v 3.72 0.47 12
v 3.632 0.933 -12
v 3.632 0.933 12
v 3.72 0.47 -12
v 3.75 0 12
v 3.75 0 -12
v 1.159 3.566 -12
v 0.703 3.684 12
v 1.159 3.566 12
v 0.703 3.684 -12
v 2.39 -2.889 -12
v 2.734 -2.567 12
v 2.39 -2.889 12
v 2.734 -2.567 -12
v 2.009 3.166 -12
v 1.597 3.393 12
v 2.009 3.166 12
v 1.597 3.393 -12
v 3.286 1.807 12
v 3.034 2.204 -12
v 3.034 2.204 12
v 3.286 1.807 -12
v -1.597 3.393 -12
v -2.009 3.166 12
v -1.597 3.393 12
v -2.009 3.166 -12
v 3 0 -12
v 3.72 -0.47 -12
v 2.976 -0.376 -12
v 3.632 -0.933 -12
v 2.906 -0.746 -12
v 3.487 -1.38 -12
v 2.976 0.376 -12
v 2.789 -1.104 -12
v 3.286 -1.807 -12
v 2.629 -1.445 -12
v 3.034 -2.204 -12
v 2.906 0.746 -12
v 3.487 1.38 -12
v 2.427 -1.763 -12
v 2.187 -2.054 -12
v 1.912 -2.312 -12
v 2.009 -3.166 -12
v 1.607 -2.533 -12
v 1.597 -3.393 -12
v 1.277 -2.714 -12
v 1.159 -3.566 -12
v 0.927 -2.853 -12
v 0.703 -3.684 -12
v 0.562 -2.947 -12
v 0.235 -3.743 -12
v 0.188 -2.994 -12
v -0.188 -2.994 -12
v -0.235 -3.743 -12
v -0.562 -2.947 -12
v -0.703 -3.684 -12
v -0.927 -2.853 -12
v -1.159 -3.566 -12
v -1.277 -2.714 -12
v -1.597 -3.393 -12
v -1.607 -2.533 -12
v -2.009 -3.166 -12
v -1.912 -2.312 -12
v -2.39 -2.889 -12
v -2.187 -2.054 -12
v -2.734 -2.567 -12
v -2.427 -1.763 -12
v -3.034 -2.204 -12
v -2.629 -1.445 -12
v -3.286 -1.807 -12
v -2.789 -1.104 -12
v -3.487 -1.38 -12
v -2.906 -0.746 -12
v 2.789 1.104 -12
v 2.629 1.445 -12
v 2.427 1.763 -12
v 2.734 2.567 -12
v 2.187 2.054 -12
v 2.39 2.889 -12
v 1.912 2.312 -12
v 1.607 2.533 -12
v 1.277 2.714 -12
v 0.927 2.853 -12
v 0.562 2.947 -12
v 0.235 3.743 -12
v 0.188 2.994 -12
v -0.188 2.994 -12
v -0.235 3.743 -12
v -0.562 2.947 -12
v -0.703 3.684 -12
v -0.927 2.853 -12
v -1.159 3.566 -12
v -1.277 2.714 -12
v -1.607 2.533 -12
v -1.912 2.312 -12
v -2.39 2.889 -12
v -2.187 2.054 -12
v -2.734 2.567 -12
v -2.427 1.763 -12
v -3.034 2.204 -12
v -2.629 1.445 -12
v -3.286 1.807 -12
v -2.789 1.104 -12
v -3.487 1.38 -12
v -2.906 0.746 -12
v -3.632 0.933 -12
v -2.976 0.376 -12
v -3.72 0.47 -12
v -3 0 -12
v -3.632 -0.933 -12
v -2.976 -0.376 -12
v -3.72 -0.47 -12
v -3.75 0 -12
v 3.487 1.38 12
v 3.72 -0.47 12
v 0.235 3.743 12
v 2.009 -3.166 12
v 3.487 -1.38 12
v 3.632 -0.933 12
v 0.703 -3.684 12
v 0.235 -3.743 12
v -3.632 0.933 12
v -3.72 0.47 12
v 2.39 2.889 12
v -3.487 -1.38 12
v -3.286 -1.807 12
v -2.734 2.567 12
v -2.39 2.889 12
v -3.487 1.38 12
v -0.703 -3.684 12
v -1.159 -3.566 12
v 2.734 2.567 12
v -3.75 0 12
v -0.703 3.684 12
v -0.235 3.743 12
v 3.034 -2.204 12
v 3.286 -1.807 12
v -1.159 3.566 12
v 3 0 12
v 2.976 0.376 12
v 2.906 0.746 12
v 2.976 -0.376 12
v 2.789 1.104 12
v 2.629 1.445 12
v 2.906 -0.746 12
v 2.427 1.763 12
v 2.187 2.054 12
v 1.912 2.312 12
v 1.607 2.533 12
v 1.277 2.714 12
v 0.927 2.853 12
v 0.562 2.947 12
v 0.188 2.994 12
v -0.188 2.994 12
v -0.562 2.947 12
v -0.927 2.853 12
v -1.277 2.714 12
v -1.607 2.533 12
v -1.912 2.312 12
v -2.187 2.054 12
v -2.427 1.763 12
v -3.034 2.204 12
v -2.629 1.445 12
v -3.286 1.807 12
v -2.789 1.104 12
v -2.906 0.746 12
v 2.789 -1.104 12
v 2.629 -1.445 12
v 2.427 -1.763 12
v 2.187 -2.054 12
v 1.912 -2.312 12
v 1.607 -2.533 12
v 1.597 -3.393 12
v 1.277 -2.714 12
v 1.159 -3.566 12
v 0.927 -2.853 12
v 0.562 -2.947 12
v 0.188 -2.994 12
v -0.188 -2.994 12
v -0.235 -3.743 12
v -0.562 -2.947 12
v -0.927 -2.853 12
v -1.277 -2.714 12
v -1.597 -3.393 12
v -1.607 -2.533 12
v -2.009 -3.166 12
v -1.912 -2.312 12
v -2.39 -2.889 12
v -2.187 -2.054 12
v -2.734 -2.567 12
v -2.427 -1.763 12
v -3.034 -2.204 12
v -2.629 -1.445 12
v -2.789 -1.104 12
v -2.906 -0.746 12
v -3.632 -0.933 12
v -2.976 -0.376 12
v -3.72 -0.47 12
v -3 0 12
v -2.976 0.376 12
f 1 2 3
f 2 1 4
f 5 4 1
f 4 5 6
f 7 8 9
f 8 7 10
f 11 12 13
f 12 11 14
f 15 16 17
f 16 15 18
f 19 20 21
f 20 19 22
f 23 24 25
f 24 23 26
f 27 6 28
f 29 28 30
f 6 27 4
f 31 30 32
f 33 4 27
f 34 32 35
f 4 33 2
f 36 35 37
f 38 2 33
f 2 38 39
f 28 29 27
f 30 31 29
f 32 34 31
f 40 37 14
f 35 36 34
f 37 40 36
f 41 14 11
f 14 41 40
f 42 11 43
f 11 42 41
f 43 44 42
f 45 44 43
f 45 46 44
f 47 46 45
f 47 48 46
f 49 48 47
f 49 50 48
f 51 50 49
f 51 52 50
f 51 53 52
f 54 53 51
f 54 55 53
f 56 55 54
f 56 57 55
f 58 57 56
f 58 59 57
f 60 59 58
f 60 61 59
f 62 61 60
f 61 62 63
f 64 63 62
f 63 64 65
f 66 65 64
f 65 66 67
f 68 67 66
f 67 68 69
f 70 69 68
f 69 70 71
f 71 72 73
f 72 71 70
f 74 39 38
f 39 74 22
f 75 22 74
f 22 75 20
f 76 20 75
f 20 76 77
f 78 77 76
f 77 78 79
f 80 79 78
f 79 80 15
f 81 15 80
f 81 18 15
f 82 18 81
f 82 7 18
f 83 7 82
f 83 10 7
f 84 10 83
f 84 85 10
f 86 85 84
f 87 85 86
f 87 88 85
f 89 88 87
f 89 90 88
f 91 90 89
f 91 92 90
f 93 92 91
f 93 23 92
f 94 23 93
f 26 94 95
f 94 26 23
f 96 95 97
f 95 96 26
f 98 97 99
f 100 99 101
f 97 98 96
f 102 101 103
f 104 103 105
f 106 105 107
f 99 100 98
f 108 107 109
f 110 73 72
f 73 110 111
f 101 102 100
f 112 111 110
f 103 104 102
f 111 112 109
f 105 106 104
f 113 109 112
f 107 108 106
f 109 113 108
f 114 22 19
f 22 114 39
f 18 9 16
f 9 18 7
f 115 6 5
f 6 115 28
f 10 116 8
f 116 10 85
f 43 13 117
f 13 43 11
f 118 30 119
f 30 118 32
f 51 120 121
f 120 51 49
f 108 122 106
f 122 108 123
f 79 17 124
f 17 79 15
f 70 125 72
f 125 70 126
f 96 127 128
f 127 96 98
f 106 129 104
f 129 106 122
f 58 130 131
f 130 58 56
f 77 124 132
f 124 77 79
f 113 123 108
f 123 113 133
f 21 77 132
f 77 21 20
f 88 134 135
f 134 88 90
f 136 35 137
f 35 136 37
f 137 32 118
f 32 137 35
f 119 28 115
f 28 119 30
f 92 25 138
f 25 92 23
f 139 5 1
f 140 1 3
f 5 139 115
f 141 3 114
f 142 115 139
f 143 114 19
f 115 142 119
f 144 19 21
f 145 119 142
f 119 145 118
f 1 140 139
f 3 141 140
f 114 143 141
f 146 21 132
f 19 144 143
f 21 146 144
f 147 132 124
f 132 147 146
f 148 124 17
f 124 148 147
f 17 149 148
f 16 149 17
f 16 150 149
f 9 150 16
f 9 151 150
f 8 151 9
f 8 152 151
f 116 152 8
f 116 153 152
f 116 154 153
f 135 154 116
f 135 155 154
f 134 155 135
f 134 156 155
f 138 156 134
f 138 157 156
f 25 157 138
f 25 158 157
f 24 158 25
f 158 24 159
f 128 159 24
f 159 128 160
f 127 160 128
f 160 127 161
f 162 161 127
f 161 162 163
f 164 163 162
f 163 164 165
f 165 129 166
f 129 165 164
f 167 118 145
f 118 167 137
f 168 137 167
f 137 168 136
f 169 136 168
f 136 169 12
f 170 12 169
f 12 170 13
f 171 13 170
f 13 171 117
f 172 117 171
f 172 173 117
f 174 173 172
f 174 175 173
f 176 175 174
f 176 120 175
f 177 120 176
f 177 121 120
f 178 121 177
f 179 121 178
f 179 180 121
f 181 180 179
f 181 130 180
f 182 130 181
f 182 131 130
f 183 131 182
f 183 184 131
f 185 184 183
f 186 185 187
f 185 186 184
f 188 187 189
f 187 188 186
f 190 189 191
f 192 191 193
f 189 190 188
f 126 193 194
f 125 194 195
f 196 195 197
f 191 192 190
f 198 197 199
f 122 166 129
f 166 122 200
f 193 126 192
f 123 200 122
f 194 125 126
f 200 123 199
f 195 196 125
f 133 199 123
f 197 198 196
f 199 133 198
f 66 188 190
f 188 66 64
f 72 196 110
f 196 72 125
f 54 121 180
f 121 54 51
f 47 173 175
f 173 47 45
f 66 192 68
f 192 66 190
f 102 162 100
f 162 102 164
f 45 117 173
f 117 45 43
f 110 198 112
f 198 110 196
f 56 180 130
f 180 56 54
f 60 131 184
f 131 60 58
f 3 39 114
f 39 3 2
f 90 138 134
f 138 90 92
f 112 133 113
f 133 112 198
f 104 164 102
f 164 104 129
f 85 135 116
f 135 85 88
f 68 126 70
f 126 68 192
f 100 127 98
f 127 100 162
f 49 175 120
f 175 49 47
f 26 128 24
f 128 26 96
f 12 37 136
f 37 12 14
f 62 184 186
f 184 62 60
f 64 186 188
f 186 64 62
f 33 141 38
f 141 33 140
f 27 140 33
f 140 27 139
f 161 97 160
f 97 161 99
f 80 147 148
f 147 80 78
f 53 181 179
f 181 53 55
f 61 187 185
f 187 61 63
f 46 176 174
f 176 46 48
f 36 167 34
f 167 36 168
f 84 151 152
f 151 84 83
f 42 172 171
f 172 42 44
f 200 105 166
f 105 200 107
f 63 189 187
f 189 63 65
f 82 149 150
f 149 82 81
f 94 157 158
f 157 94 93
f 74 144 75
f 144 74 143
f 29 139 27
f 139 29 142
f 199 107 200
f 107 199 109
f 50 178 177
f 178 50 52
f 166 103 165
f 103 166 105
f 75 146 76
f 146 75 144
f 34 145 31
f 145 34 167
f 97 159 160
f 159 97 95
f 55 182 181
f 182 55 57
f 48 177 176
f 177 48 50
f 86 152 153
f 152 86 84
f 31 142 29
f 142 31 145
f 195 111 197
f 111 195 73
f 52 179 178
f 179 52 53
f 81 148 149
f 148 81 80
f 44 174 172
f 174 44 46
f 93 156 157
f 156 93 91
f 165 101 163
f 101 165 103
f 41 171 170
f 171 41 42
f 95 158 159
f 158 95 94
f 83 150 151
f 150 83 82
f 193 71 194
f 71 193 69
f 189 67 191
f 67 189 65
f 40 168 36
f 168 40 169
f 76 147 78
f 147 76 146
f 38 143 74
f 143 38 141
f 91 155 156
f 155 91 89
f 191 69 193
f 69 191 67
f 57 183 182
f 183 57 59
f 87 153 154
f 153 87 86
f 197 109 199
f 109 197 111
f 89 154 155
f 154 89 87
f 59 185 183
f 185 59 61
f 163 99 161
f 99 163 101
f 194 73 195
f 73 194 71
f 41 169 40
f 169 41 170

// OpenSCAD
$fn = 50;


difference() {
	union() {
		translate(v = [0, 0, -12.0000000000]) {
			cylinder(h = 24, r = 3.7500000000);
		}
	}
	union() {
		translate(v = [0, 0, -100.0000000000]) {
			cylinder(h = 200, r = 3.0000000000);
		}
	}
}
